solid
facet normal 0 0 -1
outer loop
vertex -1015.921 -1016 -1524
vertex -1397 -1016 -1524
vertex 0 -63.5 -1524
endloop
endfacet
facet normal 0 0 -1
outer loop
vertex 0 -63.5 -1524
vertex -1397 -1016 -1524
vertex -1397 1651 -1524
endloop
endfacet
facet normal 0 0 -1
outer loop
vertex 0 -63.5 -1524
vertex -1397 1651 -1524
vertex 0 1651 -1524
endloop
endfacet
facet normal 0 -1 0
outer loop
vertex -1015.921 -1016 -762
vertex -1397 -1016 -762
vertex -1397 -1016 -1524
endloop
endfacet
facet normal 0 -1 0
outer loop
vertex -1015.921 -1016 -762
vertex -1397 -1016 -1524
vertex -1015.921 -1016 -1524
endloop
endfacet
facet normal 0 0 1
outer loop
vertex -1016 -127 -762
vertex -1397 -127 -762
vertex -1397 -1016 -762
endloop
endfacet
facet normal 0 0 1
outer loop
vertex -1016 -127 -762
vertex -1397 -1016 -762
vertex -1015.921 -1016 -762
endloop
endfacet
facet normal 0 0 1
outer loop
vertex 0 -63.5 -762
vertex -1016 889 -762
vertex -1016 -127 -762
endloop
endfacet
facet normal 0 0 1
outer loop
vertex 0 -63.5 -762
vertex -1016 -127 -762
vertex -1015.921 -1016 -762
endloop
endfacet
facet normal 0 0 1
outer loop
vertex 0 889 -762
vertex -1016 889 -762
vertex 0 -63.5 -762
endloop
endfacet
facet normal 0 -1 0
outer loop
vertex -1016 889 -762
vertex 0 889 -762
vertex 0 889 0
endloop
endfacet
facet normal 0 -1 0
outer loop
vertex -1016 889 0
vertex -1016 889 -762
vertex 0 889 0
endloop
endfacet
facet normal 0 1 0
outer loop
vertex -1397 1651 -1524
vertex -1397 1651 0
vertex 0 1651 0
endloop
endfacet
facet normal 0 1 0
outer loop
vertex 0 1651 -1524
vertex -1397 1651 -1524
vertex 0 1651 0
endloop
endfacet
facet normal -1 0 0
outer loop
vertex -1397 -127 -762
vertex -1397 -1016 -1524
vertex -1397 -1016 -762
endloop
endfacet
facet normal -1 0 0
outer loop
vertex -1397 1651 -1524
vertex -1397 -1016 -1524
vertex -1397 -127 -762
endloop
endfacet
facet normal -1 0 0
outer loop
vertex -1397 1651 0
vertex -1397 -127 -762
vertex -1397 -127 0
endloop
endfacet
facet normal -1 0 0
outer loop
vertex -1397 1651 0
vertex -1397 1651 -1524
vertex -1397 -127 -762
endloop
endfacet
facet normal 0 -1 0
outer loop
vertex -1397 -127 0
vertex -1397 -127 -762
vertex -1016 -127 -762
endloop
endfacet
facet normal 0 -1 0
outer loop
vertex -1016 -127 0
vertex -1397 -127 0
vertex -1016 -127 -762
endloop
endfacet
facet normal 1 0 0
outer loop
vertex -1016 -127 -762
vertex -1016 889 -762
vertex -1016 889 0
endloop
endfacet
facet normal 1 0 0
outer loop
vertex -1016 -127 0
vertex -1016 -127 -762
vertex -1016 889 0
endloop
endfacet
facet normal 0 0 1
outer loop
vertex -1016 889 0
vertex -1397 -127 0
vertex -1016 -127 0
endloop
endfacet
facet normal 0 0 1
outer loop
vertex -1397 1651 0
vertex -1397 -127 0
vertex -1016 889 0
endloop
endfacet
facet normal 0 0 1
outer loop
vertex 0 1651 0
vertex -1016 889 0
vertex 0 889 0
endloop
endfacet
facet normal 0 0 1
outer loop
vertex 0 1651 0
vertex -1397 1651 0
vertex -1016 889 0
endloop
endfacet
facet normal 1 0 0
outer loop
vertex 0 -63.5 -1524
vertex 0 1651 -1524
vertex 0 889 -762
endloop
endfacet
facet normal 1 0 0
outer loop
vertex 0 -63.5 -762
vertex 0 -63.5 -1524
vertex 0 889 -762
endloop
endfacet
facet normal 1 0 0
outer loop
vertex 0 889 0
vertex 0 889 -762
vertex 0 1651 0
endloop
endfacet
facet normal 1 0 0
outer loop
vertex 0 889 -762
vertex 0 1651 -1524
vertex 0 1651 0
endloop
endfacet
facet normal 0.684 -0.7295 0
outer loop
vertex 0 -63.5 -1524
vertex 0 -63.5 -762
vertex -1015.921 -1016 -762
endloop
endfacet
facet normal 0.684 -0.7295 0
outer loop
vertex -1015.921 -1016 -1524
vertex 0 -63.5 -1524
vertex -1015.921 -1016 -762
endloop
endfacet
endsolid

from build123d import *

# Parameters (mm, degrees)
F0_W      = 1778
F0_H      = 1524
F2_DEPTH  = 1397
F1_W      = 889
F1_H      = 762
F3_DEPTH  = 1755.14
F4_W      = 1397
F4_H      = 762
F5_DEPTH  = 1016
F7_DEPTH  = 1226.82
F8_W      = 381
F8_H      = 762
F9_DEPTH  = 1016
F10_W     = 1397
F10_H     = 127
F11_DEPTH = 254000


with BuildPart() as f2:
    # F0 (on Right) → F2 (new body)
    with BuildSketch(Plane.YZ):
        with Locations((889, -762)):
            Rectangle(F0_W, F0_H)
    extrude(amount=-F2_DEPTH)

    # F1 (on face) → F3 (cut)
    with BuildSketch(Plane.YZ):
        with Locations((444.5, -381)):
            Rectangle(F1_W, F1_H)
    extrude(amount=-F3_DEPTH, mode=Mode.SUBTRACT)

    # F4 (on face) → F5 (join)
    with BuildSketch(Plane.XZ):
        with Locations((-698.5, -1143)):
            Rectangle(F4_W, F4_H)
    extrude(amount=F5_DEPTH)

    # F6 (on face) → F7 (cut)
    with BuildSketch(Plane.XY.offset(-762)):
        Polygon((0, -1016), (0, -63.5), (-1015.920877, -1016), align=None)
    extrude(amount=-F7_DEPTH, mode=Mode.SUBTRACT)

    # F8 (on face) → F9 (join)
    with BuildSketch(Plane.XZ.offset(-889)):
        with Locations((-1206.5, -381)):
            Rectangle(F8_W, F8_H)
    extrude(amount=F9_DEPTH)

    # F10 (on face) → F11 (cut)
    with BuildSketch(Plane.XY):
        with Locations((-698.5, 1714.5)):
            Rectangle(F10_W, F10_H)
    extrude(amount=-F11_DEPTH, mode=Mode.SUBTRACT)


solid = f2.part
